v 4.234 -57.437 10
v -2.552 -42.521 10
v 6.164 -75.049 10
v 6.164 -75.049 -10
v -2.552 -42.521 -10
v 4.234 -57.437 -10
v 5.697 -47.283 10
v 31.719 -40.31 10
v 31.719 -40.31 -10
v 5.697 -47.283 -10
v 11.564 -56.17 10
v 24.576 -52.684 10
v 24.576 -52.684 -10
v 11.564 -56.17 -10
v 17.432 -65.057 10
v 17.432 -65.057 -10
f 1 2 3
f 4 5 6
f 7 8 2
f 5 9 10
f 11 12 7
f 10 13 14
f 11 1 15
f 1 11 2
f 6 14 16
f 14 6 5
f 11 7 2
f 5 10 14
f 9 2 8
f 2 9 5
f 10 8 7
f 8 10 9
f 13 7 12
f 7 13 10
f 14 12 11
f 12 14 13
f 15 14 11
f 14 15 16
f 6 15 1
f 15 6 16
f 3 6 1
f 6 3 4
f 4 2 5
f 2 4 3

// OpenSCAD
polyhedron(
    points=[
    [-2.55221605790644, -42.5205678841871, 10],
    [31.7194598552339, -40.3102839420935, 10],
    [5.69667591314034, -47.2830678841871, 10],
    [24.5757098552339, -52.6836218986637, 10],
    [11.5643178841871, -56.1700138697105, 10],
    [17.4319598552339, -65.0569598552339, 10],
    [4.23373270155905, -57.4369598552339, 10],
    [6.16376386971051, -75.0490478118041, 10],
    [-2.55221605790644, -42.5205678841871, -10],
    [31.7194598552339, -40.3102839420935, -10],
    [5.69667591314034, -47.2830678841871, -10],
    [24.5757098552339, -52.6836218986637, -10],
    [11.5643178841871, -56.1700138697105, -10],
    [17.4319598552339, -65.0569598552339, -10],
    [4.23373270155905, -57.4369598552339, -10],
    [6.16376386971051, -75.0490478118041, -10],
    ],
    faces=[
        [7,0,6],
        [14,8,15],
        [0,1,2],
        [10,9,8],
        [2,3,4],
        [12,11,10],
        [6,0,4,5],
        [13,12,8,14],
        [0,2,4],
        [12,10,8],
        [0,8,9,1],
        [1,9,10,2],
        [2,10,11,3],
        [3,11,12,4],
        [4,12,13,5],
        [5,13,14,6],
        [6,14,15,7],
        [7,15,8,0],
    ]
);
